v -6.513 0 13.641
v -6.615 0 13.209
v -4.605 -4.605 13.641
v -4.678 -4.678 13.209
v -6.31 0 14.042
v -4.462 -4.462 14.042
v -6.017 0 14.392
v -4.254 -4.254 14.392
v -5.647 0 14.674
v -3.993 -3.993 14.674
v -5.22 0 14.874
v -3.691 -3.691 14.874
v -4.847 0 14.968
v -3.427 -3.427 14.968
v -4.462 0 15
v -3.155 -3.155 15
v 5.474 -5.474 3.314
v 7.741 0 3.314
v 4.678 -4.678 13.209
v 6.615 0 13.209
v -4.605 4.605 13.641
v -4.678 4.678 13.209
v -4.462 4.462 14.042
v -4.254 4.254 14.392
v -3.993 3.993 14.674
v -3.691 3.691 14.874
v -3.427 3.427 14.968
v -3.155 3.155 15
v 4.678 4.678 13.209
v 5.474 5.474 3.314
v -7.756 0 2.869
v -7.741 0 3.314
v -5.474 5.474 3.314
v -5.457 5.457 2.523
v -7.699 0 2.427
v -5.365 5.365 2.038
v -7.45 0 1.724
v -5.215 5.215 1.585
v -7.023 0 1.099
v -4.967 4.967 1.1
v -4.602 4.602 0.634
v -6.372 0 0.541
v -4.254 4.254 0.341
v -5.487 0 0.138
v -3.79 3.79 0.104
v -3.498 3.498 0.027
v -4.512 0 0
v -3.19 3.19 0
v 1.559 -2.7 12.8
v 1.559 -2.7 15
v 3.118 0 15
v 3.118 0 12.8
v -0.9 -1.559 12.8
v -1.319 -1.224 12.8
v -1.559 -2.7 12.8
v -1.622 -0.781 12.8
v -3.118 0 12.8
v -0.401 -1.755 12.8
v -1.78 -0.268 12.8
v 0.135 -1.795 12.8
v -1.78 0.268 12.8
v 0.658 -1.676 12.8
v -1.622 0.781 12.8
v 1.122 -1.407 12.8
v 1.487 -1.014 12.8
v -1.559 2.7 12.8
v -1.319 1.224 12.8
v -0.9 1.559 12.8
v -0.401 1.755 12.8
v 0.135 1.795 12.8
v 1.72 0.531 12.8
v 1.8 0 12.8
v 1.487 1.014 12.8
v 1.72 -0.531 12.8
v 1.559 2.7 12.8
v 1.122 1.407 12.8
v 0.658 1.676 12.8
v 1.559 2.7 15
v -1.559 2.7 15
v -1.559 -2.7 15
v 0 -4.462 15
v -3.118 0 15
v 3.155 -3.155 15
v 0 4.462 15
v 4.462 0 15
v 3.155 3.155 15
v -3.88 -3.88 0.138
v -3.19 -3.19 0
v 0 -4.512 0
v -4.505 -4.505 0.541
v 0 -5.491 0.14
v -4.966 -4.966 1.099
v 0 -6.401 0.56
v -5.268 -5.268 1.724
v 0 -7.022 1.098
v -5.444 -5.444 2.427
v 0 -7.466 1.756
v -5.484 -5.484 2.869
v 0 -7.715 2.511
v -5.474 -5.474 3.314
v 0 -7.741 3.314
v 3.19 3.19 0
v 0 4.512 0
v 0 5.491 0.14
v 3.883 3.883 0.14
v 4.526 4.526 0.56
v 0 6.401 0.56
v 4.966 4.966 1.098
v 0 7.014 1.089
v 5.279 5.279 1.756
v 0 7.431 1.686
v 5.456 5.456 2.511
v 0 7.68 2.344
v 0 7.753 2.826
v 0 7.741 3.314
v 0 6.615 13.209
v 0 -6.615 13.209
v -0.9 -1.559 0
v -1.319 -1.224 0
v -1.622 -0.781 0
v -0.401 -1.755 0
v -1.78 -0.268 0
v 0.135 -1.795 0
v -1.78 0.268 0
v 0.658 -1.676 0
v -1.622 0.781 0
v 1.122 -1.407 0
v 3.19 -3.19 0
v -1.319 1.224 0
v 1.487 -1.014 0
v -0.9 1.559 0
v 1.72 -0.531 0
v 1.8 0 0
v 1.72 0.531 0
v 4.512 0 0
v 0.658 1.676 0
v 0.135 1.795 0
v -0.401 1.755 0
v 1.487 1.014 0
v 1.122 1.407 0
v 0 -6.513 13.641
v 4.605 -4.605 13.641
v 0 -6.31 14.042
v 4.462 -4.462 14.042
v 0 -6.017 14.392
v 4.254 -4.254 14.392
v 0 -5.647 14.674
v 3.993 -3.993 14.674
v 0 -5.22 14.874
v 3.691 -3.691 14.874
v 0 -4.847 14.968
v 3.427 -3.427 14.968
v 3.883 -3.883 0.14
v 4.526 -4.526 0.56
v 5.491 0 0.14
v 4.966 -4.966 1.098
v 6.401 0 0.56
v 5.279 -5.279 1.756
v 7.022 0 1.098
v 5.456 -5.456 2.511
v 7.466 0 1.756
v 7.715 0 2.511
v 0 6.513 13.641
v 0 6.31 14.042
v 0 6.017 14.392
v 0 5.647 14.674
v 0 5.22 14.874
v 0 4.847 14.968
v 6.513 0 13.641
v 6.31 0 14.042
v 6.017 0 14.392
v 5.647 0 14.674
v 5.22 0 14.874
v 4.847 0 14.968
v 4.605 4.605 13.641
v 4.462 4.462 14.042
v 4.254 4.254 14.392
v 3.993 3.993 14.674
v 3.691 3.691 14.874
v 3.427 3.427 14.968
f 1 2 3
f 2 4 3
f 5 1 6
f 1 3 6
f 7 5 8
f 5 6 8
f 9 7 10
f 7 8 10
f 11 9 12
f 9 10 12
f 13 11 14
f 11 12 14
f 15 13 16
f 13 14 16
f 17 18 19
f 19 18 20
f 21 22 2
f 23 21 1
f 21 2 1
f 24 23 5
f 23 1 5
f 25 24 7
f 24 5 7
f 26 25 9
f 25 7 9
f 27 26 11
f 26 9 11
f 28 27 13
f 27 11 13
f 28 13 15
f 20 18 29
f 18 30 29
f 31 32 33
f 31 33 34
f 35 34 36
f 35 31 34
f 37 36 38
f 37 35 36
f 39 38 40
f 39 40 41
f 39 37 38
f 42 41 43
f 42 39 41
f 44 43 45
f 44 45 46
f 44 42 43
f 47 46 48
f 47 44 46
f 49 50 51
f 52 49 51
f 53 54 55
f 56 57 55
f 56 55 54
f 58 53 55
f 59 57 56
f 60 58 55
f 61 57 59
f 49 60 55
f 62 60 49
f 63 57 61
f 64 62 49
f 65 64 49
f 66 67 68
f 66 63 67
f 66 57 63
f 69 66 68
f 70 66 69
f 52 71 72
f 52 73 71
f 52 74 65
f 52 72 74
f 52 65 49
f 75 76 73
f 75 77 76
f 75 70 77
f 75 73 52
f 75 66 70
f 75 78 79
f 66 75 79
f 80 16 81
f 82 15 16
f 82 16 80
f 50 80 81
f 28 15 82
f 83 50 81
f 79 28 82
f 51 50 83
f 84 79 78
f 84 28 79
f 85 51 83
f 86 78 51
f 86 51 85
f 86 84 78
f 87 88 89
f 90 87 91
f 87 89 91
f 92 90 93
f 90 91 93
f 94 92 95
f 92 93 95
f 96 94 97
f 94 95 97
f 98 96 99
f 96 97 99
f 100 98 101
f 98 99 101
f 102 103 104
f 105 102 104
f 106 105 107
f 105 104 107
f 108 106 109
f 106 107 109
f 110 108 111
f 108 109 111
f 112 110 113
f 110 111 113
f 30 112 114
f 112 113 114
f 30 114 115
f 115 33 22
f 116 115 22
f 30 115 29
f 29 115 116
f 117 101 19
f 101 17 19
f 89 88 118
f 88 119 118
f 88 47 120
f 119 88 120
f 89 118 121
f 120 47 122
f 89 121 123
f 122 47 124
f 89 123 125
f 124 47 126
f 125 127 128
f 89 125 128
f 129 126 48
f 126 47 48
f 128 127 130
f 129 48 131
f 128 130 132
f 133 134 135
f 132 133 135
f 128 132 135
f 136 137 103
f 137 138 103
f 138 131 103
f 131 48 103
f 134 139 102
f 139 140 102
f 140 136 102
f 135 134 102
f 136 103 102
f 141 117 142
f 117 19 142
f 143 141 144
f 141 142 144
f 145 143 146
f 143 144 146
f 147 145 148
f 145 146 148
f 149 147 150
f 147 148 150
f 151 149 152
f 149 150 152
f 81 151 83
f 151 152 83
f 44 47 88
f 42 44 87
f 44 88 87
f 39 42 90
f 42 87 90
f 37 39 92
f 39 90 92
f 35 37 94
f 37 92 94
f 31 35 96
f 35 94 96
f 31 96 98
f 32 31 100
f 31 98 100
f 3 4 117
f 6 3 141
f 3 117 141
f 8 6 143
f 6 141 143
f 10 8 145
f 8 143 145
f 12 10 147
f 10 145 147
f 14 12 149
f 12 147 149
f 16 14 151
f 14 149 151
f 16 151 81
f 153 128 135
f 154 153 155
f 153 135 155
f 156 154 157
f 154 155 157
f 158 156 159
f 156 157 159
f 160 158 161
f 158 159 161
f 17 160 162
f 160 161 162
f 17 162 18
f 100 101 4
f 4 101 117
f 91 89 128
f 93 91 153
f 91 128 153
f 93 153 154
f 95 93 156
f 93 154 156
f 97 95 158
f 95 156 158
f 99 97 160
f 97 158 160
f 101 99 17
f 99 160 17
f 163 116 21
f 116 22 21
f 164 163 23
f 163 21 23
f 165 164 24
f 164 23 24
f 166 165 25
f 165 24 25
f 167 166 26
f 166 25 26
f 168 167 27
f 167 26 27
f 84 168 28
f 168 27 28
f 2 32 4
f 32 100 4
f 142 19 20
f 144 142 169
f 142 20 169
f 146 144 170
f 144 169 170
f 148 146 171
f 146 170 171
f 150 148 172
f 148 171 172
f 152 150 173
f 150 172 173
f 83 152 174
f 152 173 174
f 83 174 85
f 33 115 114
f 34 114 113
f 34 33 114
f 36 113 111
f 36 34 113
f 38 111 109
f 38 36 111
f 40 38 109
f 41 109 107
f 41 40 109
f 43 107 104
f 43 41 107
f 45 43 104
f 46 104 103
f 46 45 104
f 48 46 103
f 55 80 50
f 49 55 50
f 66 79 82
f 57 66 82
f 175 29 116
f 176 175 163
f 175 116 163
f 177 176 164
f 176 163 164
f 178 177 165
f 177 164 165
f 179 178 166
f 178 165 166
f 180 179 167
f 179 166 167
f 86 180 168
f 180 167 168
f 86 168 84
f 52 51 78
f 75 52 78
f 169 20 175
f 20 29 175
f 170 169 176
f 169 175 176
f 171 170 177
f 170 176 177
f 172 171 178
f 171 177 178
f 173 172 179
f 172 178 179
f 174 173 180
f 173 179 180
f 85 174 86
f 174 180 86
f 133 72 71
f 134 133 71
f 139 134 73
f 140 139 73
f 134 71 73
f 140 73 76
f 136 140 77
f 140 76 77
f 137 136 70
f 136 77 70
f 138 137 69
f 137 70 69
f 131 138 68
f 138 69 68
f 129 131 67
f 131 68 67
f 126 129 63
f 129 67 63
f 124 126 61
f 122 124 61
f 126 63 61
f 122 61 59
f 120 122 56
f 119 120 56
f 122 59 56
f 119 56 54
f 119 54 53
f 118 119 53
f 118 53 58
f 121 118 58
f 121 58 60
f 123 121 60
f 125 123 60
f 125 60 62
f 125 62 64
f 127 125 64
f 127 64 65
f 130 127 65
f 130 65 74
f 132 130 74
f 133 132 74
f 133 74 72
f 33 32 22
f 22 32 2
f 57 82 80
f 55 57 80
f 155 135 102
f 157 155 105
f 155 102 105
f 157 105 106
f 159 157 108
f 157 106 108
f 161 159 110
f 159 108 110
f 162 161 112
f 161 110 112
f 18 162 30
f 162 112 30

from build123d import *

# Parameters (mm, degrees)
F1_DEPTH = 15
F1_TAPER = 6
F2_R     = 1.8
F3_DEPTH = 15.001
F5_DEPTH = 2.2
F6_R     = 2
F7_R     = 3


with BuildPart() as f1:
    # F0 (on Top) → F1 (new body)
    with BuildSketch(Plane.XY):
        Polygon((-5.7402514855, 5.7402514855), (-8.1179415022, 0), (-5.7402514855, -5.7402514855), (0, -8.1179415022), (5.7402514855, -5.7402514855), (8.1179415022, 0), (5.7402514855, 5.7402514855), (0, 8.1179415022), align=None)
    extrude(amount=F1_DEPTH, taper=F1_TAPER)

    # F2 (on face) → F3 (cut, through all)
    with BuildSketch(Plane.XY.offset(15)):
        Circle(F2_R)
    extrude(amount=-F3_DEPTH, mode=Mode.SUBTRACT)

    # F4 (on face) → F5 (cut)
    with BuildSketch(Plane.XY.offset(15)):
        Polygon((-1.5588457268, 2.7), (-3.1176914536, 0), (-1.5588457268, -2.7), (1.5588457268, -2.7), (3.1176914536, 0), (1.5588457268, 2.7), align=None)
    extrude(amount=-F5_DEPTH, mode=Mode.SUBTRACT)

    # F6
    f6_edges = [f1.edges().sort_by_distance(p)[0] for p in [
        (-5.472542, -2.266801, 15),
        (-2.266801, -5.472542, 15),
        (2.266801, -5.472542, 15),
        (5.472542, -2.266801, 15),
        (5.472542, 2.266801, 15),
        (2.266801, 5.472542, 15),
        (-2.266801, 5.472542, 15),
        (-5.472542, 2.266801, 15),
    ]]
    fillet(f6_edges, radius=F6_R)

    # F7
    f7_edges = [f1.edges().sort_by_distance(p)[0] for p in [
        (-2.870126, -6.929096, 0),
        (-6.929096, -2.870126, 0),
        (2.870126, -6.929096, 0),
        (6.929096, -2.870126, 0),
        (6.929096, 2.870126, 0),
        (2.870126, 6.929096, 0),
        (-2.870126, 6.929096, 0),
        (-6.929096, 2.870126, 0),
    ]]
    fillet(f7_edges, radius=F7_R)


solid = f1.part
